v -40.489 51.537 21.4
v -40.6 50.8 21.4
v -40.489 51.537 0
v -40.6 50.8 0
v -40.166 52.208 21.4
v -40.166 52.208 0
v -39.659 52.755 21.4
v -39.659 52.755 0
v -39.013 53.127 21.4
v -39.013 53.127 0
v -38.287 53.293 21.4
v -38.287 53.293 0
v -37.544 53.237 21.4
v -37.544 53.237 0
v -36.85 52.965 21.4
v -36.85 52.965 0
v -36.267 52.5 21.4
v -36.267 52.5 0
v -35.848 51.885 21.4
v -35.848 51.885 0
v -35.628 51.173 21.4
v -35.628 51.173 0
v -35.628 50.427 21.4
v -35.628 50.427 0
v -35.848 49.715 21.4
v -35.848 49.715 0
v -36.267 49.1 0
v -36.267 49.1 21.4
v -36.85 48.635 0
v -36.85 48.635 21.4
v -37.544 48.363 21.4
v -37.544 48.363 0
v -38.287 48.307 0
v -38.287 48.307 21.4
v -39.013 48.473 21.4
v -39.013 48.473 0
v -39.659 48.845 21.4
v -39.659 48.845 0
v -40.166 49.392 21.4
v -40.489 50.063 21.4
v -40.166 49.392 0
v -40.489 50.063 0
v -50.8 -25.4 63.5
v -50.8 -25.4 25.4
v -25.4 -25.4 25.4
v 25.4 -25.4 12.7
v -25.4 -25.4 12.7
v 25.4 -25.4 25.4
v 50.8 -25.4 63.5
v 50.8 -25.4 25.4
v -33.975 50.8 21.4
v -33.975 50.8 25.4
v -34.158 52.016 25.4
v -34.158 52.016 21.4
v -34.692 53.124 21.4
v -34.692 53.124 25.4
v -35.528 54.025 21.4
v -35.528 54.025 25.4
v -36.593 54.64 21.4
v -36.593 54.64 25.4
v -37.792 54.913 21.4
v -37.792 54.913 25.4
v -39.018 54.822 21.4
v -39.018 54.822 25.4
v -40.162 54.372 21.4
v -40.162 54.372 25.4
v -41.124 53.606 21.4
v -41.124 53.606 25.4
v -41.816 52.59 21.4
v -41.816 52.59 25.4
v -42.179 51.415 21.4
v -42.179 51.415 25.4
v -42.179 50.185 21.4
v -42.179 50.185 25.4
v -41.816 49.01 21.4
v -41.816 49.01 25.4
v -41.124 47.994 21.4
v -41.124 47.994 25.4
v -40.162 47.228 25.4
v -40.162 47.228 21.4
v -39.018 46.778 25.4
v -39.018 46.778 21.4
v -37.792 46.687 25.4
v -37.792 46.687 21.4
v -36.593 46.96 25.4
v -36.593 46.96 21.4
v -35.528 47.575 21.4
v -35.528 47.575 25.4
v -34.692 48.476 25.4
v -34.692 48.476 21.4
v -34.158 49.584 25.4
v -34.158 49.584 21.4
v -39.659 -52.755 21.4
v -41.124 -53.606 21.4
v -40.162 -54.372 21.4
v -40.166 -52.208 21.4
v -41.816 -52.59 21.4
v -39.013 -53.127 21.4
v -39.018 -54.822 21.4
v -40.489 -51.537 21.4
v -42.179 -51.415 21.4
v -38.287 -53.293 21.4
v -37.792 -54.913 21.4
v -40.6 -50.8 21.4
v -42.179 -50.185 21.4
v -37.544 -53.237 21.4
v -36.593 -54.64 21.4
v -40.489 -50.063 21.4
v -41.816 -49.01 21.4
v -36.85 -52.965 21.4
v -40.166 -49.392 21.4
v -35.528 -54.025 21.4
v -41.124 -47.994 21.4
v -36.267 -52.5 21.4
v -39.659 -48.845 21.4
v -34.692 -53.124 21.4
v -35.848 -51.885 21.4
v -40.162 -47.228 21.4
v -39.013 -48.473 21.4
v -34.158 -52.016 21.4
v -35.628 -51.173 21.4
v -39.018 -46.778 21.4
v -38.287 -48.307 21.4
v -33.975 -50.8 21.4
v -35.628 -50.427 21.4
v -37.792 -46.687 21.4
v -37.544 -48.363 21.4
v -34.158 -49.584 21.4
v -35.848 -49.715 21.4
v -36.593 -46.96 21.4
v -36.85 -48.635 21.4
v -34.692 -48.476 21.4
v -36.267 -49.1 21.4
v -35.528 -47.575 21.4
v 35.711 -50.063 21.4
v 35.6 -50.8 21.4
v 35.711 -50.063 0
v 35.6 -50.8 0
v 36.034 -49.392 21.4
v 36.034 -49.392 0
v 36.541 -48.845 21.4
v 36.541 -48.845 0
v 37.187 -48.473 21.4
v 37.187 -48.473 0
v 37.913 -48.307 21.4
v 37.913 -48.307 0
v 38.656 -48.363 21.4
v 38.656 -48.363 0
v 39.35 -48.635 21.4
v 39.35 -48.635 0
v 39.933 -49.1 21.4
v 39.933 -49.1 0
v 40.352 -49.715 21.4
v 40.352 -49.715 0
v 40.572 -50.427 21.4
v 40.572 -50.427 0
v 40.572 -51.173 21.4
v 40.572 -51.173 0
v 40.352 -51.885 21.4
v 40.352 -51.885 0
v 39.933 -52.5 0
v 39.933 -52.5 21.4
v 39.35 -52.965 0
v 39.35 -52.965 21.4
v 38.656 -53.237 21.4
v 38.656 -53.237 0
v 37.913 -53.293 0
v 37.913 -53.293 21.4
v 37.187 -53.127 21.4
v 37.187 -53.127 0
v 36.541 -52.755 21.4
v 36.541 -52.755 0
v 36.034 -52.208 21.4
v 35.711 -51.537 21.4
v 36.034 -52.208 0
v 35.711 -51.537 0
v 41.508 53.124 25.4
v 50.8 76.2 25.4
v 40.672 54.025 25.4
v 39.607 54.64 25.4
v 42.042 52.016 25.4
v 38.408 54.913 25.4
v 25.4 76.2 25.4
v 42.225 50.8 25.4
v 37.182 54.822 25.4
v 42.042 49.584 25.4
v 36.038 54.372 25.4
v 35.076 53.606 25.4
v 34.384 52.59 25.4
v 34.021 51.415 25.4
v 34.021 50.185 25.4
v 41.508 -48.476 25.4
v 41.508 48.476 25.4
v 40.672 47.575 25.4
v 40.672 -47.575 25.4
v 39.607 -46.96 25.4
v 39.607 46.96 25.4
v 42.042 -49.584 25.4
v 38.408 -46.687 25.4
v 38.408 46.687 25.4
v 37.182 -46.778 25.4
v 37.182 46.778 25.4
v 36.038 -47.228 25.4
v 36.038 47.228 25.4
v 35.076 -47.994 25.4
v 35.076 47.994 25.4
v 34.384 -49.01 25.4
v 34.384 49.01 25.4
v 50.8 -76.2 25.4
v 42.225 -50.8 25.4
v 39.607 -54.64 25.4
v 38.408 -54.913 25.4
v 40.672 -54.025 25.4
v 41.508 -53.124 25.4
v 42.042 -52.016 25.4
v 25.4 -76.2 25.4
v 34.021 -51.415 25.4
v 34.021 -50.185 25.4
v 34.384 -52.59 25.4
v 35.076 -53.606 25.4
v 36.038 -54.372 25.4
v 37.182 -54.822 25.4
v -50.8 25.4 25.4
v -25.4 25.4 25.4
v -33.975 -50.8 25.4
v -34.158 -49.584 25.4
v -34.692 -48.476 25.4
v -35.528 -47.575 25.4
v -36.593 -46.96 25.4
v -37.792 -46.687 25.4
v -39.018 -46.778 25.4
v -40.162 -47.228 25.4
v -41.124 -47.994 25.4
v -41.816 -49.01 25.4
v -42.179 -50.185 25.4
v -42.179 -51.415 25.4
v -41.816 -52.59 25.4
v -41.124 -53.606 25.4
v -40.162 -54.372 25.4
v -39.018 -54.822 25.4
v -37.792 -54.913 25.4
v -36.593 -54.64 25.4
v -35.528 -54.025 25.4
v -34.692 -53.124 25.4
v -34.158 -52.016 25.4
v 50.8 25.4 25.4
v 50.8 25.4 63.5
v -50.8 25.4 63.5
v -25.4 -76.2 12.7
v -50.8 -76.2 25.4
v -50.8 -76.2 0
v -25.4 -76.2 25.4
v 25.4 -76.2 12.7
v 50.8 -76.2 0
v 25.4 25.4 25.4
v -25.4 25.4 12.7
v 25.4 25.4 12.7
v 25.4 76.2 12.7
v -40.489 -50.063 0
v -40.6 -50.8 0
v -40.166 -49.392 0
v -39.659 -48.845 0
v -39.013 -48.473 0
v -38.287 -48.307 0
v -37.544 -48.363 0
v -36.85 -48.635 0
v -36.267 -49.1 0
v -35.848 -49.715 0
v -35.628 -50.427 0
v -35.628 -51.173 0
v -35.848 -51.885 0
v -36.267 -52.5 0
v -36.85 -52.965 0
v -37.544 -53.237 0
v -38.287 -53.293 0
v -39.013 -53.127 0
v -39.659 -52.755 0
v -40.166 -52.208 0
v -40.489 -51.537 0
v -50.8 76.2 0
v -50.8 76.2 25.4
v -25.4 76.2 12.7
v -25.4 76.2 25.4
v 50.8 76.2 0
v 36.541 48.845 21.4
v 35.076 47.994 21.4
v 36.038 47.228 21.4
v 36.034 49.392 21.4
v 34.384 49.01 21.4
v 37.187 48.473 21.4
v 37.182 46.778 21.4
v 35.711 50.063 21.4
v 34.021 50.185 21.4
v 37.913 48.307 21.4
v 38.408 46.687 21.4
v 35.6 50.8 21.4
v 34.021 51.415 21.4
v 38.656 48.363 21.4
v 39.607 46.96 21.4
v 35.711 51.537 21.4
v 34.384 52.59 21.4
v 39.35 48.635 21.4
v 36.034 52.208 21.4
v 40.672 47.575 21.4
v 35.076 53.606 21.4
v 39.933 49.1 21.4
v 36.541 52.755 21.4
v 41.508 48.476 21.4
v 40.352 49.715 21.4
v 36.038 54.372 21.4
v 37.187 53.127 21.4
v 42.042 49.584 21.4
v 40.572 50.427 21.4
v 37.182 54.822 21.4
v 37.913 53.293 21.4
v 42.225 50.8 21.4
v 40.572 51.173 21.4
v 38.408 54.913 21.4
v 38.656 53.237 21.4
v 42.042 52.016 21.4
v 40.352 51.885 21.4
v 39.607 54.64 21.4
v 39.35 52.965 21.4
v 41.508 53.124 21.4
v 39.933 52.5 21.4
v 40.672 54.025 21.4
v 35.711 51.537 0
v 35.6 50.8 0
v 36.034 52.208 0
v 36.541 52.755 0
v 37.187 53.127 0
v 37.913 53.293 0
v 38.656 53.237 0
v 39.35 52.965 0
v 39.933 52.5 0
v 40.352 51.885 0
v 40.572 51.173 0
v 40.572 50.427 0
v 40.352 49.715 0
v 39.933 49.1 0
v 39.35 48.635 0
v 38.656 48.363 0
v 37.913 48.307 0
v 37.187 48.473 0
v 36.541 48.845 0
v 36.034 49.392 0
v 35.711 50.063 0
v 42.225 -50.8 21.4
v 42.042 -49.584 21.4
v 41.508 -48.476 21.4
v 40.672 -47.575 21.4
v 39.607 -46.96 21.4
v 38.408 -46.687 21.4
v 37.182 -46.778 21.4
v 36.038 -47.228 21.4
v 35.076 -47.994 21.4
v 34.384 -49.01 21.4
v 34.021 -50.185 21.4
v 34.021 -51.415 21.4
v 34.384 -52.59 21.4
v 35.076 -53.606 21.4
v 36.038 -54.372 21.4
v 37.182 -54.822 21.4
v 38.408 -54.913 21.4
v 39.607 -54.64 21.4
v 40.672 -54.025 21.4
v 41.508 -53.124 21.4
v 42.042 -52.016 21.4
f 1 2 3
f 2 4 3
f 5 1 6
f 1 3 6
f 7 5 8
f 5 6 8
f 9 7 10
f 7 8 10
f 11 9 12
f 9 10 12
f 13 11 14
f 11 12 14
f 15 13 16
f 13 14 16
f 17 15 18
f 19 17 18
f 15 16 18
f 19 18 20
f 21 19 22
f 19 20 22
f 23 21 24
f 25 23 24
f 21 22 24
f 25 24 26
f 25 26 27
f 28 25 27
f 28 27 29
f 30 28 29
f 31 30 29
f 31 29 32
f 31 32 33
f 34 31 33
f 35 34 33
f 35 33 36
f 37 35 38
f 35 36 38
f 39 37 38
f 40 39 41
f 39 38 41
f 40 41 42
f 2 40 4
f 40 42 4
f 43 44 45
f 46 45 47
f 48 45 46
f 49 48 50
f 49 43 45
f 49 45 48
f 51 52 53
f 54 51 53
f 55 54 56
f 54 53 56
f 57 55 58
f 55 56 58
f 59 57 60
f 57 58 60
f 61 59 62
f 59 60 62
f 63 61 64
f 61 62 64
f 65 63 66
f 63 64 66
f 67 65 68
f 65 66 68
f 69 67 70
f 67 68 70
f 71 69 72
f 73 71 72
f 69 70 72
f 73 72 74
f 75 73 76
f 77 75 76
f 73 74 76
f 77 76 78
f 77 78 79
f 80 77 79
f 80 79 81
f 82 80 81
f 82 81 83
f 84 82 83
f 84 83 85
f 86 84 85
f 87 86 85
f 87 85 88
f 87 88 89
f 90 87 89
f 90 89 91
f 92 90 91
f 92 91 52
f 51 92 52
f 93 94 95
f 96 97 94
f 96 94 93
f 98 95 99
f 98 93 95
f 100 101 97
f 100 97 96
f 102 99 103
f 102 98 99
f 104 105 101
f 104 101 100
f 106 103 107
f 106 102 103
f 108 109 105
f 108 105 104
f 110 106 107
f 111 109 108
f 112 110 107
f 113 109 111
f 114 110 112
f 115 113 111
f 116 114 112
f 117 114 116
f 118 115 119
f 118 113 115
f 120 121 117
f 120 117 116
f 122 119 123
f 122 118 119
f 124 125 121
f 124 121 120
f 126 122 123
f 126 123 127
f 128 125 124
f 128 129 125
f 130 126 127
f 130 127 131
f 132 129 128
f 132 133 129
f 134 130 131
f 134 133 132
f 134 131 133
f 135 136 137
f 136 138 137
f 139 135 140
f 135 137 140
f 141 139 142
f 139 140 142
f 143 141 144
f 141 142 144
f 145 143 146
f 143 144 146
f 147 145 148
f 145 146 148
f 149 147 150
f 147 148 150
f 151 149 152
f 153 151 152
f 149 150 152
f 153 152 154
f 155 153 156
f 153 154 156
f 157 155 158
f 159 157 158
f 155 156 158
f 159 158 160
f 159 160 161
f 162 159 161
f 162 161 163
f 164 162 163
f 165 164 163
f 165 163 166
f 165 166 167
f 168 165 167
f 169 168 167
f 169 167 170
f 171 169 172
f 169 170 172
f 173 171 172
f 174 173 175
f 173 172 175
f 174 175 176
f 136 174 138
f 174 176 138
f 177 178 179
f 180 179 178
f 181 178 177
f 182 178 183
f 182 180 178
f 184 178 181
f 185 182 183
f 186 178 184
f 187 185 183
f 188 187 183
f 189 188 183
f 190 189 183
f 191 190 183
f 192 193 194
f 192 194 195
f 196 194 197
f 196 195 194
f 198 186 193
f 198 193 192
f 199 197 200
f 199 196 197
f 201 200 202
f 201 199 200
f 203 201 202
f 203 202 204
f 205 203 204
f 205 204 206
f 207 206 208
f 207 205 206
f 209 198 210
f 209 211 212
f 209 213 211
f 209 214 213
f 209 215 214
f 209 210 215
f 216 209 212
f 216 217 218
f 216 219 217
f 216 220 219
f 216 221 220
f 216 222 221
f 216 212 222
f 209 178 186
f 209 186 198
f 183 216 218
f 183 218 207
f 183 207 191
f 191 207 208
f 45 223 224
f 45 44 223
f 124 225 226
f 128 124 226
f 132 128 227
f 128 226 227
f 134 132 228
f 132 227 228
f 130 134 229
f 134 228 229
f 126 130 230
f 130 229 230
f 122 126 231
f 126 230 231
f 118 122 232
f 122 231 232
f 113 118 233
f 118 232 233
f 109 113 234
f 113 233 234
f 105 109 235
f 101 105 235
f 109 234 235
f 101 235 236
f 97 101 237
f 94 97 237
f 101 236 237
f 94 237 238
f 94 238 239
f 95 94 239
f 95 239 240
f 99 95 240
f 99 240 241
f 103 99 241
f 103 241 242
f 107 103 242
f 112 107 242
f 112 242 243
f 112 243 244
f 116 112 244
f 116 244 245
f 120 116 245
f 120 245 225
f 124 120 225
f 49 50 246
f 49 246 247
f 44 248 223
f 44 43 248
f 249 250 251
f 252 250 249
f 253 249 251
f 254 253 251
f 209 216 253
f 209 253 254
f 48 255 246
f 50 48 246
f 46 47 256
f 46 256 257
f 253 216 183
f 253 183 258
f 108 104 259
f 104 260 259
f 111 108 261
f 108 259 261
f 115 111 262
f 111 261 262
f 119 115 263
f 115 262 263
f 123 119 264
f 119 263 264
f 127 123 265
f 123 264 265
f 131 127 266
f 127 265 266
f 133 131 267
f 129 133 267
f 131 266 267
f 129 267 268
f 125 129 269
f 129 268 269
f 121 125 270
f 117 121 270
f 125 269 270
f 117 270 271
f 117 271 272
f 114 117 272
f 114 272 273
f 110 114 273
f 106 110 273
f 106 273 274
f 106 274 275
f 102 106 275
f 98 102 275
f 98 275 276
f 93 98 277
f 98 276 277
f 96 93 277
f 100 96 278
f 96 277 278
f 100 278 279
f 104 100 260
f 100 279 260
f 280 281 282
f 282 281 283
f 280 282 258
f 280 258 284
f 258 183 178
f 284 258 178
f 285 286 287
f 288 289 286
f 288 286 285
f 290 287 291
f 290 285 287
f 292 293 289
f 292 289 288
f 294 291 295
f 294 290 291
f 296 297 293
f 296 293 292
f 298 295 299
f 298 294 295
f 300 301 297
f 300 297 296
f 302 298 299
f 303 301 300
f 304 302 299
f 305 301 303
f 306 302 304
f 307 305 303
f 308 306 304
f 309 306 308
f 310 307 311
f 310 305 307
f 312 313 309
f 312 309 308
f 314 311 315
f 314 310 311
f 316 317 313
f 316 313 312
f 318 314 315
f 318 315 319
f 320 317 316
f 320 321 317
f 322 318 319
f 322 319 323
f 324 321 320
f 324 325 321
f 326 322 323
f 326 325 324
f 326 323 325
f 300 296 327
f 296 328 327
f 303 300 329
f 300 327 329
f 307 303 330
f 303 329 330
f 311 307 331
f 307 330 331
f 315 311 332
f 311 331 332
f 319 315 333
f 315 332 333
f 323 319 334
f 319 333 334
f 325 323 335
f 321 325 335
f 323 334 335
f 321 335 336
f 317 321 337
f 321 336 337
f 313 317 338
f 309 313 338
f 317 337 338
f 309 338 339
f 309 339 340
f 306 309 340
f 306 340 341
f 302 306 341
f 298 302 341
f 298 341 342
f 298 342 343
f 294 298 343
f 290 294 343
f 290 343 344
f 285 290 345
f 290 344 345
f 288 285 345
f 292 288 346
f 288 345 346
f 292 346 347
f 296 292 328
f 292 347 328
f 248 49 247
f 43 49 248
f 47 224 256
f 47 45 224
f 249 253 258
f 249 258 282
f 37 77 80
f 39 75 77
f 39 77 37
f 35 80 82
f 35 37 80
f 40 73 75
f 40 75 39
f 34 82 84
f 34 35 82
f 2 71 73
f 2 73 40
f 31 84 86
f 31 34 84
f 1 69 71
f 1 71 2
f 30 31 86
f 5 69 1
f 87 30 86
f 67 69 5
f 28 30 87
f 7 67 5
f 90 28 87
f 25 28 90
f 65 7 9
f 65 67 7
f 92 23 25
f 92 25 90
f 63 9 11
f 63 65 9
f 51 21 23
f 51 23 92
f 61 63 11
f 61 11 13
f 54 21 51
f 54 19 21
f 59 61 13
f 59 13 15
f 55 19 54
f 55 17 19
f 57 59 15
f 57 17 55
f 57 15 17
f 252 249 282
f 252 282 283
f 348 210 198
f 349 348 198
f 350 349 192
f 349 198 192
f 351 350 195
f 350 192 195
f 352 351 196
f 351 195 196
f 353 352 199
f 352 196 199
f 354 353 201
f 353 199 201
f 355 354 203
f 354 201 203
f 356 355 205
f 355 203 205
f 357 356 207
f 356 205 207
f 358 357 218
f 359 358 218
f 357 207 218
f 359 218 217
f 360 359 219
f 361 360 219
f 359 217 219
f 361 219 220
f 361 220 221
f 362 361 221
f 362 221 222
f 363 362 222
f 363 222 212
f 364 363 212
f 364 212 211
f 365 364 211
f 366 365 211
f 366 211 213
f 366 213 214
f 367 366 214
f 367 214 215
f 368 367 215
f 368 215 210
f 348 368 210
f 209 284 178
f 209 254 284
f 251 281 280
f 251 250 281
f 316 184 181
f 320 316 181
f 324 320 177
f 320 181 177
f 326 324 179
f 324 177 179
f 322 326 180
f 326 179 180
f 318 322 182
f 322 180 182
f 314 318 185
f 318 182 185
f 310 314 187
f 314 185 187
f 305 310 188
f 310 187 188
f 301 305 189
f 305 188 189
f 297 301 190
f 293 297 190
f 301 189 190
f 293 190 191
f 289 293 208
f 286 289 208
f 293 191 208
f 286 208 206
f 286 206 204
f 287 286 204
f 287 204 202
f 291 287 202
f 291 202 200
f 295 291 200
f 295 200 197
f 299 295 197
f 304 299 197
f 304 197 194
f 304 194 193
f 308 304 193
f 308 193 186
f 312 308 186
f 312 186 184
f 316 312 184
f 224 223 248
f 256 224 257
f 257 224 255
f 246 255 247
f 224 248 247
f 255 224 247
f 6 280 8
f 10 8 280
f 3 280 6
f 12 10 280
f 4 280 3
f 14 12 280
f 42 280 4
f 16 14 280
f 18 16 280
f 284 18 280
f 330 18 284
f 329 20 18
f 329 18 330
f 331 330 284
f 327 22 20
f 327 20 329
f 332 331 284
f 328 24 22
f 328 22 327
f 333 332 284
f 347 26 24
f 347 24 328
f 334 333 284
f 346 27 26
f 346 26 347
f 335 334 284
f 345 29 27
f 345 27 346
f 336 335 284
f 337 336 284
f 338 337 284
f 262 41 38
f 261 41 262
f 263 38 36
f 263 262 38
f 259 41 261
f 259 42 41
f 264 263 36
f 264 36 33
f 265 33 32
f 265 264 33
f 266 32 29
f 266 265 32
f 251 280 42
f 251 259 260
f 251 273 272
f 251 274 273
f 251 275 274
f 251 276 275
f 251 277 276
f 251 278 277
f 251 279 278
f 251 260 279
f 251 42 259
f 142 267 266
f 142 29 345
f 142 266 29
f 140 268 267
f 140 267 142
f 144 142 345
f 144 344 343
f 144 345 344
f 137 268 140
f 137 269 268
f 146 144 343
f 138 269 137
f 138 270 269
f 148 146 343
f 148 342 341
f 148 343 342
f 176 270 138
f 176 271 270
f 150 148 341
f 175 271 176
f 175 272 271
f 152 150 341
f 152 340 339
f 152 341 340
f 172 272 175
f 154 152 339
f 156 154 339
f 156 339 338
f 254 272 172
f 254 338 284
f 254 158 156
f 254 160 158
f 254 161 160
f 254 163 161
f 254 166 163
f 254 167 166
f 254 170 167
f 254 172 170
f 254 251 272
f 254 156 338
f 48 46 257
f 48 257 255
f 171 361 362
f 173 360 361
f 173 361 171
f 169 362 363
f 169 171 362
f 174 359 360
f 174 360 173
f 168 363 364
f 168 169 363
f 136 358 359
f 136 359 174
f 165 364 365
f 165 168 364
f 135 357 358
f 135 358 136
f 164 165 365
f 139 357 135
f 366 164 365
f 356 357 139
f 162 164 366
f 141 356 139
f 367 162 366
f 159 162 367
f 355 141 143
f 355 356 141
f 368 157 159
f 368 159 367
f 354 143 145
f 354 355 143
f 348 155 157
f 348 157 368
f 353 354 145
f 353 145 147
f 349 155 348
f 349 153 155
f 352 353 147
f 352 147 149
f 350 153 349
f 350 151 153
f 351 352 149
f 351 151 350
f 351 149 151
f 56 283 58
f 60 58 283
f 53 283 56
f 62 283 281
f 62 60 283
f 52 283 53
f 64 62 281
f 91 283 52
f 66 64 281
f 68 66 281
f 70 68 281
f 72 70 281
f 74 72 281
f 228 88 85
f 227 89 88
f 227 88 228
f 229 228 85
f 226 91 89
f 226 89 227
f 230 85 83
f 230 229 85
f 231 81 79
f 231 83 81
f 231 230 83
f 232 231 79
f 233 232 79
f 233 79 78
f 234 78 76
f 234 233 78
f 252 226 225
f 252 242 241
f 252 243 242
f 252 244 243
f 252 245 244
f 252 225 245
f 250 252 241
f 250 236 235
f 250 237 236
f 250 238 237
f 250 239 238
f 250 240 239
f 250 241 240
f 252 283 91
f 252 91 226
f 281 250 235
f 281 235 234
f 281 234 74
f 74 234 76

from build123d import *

# Parameters (mm, degrees)
F1_DEPTH       = 76.2
F3_DEPTH       = 25.4
F5_D           = 5
F5_CBORE_D     = 8.25
F5_CBORE_DEPTH = 4


with BuildPart() as f1:
    # F0 (on Front) → F1 (new body, symmetric)
    with BuildSketch(Plane.XZ):
        Polygon((50.8, 0), (50.8, 25.4), (25.4, 25.4), (25.4, 12.7), (0, 12.7), (-25.4, 12.7), (-25.4, 25.4), (-50.8, 25.4), (-50.8, 0), (0, 0), align=None)
    extrude(amount=F1_DEPTH, both=True)

    # F5 (through all)
    with Locations(Plane.XY.offset(25.4)):
        with Locations((-38.1, 50.8), (38.1, 50.8), (38.1, -50.8), (-38.1, -50.8)):
            CounterBoreHole(F5_D / 2, F5_CBORE_D / 2, F5_CBORE_DEPTH)


with BuildPart() as f3:
    # F2 (on Front) → F3 (new body, symmetric)
    with BuildSketch(Plane.XZ):
        Polygon((-25.4, 25.4), (-25.4, 12.7), (25.4, 12.7), (25.4, 25.4), (50.8, 25.4), (50.8, 63.5), (-50.8, 63.5), (-50.8, 25.4), align=None)
    extrude(amount=F3_DEPTH, both=True)


solid = Compound([f1.part, f3.part])
